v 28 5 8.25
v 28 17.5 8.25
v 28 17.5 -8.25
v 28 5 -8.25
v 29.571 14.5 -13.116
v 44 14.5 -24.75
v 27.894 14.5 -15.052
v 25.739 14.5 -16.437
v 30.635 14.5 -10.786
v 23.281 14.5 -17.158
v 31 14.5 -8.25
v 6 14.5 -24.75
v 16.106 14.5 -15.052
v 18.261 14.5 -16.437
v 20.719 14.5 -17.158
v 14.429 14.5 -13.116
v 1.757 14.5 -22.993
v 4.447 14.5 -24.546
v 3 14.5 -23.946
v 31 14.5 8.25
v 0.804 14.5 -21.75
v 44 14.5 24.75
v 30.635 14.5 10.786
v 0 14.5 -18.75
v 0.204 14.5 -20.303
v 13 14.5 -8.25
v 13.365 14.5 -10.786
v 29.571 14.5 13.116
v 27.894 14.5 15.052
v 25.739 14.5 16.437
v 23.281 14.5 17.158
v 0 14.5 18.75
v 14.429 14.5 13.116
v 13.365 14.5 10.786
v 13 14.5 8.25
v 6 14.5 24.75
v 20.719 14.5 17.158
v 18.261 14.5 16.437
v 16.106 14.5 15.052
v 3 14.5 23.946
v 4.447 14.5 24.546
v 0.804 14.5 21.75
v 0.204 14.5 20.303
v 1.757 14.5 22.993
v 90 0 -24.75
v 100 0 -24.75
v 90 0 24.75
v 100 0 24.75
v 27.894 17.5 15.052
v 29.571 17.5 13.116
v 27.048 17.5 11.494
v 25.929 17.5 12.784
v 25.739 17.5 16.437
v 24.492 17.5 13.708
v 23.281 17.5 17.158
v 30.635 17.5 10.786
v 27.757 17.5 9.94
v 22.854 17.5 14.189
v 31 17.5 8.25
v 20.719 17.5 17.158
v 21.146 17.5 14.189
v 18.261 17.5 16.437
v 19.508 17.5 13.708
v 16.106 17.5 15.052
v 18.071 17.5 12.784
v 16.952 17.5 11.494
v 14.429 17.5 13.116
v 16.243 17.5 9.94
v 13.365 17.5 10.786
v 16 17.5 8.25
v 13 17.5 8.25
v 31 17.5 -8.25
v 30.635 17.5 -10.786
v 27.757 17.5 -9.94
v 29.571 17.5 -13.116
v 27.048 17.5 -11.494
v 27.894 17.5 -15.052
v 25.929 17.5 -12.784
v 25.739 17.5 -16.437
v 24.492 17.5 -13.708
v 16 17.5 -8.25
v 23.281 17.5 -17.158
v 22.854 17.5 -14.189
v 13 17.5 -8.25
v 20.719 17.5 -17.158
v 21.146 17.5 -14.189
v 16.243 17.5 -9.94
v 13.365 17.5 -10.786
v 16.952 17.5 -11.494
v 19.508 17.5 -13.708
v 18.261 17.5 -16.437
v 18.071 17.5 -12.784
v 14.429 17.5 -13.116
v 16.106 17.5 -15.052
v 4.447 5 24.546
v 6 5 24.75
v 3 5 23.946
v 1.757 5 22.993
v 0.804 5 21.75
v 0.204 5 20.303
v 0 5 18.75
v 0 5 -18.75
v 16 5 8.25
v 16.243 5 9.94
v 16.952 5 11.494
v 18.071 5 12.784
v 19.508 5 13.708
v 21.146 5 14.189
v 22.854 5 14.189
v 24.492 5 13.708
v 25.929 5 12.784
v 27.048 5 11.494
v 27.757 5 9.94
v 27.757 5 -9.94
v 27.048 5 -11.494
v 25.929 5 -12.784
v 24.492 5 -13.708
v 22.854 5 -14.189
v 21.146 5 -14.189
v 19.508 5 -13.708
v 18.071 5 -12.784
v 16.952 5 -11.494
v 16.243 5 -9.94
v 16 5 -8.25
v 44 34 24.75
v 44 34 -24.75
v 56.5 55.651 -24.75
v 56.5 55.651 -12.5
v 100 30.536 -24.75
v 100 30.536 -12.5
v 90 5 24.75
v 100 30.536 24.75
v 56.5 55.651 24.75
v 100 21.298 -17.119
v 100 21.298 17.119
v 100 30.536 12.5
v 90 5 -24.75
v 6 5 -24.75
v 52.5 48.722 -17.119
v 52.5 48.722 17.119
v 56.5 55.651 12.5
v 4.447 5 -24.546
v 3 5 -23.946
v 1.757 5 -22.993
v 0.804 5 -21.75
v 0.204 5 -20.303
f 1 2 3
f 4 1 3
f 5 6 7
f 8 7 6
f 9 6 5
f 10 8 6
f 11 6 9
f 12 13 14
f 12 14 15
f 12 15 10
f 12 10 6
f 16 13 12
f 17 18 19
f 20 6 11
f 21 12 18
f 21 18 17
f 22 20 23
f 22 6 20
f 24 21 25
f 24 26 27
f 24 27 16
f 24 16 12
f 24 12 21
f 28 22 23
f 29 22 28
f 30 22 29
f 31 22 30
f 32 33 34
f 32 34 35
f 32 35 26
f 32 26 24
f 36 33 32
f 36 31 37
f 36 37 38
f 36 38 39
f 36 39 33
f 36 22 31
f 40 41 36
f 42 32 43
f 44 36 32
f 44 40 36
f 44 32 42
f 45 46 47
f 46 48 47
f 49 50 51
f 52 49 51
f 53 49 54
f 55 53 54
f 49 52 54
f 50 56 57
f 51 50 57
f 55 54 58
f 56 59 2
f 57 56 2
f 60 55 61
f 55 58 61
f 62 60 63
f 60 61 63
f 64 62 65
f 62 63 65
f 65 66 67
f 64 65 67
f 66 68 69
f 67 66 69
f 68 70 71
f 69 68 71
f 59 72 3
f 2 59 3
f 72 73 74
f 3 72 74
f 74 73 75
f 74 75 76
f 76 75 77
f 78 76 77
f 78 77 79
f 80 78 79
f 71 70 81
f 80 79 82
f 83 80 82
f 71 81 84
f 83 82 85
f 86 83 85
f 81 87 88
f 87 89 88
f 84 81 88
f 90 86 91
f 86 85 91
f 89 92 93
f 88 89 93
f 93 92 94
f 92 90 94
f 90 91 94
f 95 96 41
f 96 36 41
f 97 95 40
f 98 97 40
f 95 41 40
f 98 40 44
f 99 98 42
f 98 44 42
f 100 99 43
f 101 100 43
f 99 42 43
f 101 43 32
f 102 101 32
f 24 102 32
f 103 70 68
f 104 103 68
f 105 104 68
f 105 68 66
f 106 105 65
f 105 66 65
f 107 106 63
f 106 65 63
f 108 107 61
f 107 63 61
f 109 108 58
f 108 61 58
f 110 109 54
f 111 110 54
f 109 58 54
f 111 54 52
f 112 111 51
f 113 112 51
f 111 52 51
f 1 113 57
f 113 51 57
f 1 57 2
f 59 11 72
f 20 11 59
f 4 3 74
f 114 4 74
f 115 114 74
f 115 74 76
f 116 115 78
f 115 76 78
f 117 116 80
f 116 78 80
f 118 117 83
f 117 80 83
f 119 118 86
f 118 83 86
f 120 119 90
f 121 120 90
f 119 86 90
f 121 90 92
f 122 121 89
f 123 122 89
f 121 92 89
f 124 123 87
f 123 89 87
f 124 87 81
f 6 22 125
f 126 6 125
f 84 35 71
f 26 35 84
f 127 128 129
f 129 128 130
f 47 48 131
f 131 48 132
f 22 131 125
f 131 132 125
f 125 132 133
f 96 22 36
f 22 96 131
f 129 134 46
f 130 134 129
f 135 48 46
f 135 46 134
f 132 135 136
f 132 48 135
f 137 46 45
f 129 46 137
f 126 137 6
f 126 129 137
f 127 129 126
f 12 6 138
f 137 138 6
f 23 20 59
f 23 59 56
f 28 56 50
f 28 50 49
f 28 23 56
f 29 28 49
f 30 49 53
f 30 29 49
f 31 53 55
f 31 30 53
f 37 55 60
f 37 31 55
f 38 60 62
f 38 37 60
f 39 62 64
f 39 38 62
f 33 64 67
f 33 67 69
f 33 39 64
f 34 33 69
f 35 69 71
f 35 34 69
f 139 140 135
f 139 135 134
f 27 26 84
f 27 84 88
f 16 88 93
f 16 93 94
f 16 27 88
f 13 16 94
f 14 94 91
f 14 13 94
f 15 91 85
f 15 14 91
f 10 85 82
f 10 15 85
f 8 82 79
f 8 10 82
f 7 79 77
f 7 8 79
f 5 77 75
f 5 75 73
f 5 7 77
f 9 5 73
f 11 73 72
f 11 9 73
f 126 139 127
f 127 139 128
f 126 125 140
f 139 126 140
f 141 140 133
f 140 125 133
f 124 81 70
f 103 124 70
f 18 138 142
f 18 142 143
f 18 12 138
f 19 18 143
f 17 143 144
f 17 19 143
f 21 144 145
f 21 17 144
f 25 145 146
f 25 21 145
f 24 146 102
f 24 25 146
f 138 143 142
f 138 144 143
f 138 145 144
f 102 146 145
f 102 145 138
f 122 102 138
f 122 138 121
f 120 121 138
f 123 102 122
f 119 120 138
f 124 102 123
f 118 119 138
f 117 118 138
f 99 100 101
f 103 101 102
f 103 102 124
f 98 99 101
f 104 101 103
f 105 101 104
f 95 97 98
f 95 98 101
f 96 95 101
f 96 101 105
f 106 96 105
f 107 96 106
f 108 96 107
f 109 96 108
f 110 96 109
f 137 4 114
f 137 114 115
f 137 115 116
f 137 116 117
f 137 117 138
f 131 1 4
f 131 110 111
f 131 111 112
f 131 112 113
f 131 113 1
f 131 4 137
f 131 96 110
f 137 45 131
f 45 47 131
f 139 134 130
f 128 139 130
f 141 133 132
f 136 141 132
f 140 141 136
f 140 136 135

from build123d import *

# Parameters (mm, degrees)
BOSS_EXTRUDE1_DEPTH = 24.75
BOSS_EXTRUDE2_DEPTH = 3
CUT_EXTRUDE1_DEPTH  = 111.932129109
CUT_EXTRUDE2_DEPTH  = 109.046199668
FILLET1_R           = 6


with BuildPart() as part:
    # Sketch1 → Boss-Extrude1 (new, symmetric)
    with BuildSketch(Plane.XY):
        Polygon((44, 34), (56.5, 55.650635095), (100, 30.535898385), (100, 21.035898385), (100, 0), (90, 0), (90, 5), (44, 5), (6, 5), (0, 5), (0, 14.5), (6, 14.5), (44, 14.5), align=None)
    extrude(amount=BOSS_EXTRUDE1_DEPTH, both=True)

    # Sketch2 → Boss-Extrude2 (add)
    with BuildSketch(Plane(origin=(0, 14.5, 0), x_dir=(1, 0, 0), z_dir=(0, 1, 0))):
        with BuildLine():
            Line((31, 8.25), (31, -8.25))
            ThreePointArc((31, -8.25), (22, -17.25), (13, -8.25))
            Line((13, -8.25), (13, 8.25))
            ThreePointArc((13, 8.25), (22, 17.25), (31, 8.25))
        make_face()
        with BuildLine():
            Line((28, 8.25), (28, -8.25))
            ThreePointArc((28, -8.25), (22, -14.25), (16, -8.25))
            Line((16, -8.25), (16, 8.25))
            ThreePointArc((16, 8.25), (22, 14.25), (28, 8.25))
        make_face(mode=Mode.SUBTRACT)
    extrude(amount=BOSS_EXTRUDE2_DEPTH)

    # Sketch3 → Cut-Extrude1 (cut, through all)
    with BuildSketch(Plane(origin=(0, 14.5, 0), x_dir=(1, 0, 0), z_dir=(0, 1, 0))):
        with BuildLine():
            Line((28, -8.25), (28, 8.25))
            ThreePointArc((28, 8.25), (22, 14.25), (16, 8.25))
            Line((16, 8.25), (16, -8.25))
            ThreePointArc((16, -8.25), (22, -14.25), (28, -8.25))
        make_face()
    extrude(amount=-CUT_EXTRUDE1_DEPTH, mode=Mode.SUBTRACT)

    # Sketch4 → Cut-Extrude2 (cut, through all)
    with BuildSketch(Plane(origin=(18.277568136, -10.552558883, 0), x_dir=(0, 0, 1), z_dir=(-0.8660254037844386, 0.5000000000000001, 0))):
        Polygon((-12.5, 76.444863729), (12.5, 76.444863729), (17.118802154, 68.444863729), (-17.118802154, 68.444863729), align=None)
    extrude(amount=-CUT_EXTRUDE2_DEPTH, mode=Mode.SUBTRACT)

    # Fillet1
    fillet1_edges = [part.edges().sort_by_distance(p)[0] for p in [
        (0, 9.75, -24.75),
        (0, 9.75, 24.75),
    ]]
    fillet(fillet1_edges, radius=FILLET1_R)


solid = part.part
